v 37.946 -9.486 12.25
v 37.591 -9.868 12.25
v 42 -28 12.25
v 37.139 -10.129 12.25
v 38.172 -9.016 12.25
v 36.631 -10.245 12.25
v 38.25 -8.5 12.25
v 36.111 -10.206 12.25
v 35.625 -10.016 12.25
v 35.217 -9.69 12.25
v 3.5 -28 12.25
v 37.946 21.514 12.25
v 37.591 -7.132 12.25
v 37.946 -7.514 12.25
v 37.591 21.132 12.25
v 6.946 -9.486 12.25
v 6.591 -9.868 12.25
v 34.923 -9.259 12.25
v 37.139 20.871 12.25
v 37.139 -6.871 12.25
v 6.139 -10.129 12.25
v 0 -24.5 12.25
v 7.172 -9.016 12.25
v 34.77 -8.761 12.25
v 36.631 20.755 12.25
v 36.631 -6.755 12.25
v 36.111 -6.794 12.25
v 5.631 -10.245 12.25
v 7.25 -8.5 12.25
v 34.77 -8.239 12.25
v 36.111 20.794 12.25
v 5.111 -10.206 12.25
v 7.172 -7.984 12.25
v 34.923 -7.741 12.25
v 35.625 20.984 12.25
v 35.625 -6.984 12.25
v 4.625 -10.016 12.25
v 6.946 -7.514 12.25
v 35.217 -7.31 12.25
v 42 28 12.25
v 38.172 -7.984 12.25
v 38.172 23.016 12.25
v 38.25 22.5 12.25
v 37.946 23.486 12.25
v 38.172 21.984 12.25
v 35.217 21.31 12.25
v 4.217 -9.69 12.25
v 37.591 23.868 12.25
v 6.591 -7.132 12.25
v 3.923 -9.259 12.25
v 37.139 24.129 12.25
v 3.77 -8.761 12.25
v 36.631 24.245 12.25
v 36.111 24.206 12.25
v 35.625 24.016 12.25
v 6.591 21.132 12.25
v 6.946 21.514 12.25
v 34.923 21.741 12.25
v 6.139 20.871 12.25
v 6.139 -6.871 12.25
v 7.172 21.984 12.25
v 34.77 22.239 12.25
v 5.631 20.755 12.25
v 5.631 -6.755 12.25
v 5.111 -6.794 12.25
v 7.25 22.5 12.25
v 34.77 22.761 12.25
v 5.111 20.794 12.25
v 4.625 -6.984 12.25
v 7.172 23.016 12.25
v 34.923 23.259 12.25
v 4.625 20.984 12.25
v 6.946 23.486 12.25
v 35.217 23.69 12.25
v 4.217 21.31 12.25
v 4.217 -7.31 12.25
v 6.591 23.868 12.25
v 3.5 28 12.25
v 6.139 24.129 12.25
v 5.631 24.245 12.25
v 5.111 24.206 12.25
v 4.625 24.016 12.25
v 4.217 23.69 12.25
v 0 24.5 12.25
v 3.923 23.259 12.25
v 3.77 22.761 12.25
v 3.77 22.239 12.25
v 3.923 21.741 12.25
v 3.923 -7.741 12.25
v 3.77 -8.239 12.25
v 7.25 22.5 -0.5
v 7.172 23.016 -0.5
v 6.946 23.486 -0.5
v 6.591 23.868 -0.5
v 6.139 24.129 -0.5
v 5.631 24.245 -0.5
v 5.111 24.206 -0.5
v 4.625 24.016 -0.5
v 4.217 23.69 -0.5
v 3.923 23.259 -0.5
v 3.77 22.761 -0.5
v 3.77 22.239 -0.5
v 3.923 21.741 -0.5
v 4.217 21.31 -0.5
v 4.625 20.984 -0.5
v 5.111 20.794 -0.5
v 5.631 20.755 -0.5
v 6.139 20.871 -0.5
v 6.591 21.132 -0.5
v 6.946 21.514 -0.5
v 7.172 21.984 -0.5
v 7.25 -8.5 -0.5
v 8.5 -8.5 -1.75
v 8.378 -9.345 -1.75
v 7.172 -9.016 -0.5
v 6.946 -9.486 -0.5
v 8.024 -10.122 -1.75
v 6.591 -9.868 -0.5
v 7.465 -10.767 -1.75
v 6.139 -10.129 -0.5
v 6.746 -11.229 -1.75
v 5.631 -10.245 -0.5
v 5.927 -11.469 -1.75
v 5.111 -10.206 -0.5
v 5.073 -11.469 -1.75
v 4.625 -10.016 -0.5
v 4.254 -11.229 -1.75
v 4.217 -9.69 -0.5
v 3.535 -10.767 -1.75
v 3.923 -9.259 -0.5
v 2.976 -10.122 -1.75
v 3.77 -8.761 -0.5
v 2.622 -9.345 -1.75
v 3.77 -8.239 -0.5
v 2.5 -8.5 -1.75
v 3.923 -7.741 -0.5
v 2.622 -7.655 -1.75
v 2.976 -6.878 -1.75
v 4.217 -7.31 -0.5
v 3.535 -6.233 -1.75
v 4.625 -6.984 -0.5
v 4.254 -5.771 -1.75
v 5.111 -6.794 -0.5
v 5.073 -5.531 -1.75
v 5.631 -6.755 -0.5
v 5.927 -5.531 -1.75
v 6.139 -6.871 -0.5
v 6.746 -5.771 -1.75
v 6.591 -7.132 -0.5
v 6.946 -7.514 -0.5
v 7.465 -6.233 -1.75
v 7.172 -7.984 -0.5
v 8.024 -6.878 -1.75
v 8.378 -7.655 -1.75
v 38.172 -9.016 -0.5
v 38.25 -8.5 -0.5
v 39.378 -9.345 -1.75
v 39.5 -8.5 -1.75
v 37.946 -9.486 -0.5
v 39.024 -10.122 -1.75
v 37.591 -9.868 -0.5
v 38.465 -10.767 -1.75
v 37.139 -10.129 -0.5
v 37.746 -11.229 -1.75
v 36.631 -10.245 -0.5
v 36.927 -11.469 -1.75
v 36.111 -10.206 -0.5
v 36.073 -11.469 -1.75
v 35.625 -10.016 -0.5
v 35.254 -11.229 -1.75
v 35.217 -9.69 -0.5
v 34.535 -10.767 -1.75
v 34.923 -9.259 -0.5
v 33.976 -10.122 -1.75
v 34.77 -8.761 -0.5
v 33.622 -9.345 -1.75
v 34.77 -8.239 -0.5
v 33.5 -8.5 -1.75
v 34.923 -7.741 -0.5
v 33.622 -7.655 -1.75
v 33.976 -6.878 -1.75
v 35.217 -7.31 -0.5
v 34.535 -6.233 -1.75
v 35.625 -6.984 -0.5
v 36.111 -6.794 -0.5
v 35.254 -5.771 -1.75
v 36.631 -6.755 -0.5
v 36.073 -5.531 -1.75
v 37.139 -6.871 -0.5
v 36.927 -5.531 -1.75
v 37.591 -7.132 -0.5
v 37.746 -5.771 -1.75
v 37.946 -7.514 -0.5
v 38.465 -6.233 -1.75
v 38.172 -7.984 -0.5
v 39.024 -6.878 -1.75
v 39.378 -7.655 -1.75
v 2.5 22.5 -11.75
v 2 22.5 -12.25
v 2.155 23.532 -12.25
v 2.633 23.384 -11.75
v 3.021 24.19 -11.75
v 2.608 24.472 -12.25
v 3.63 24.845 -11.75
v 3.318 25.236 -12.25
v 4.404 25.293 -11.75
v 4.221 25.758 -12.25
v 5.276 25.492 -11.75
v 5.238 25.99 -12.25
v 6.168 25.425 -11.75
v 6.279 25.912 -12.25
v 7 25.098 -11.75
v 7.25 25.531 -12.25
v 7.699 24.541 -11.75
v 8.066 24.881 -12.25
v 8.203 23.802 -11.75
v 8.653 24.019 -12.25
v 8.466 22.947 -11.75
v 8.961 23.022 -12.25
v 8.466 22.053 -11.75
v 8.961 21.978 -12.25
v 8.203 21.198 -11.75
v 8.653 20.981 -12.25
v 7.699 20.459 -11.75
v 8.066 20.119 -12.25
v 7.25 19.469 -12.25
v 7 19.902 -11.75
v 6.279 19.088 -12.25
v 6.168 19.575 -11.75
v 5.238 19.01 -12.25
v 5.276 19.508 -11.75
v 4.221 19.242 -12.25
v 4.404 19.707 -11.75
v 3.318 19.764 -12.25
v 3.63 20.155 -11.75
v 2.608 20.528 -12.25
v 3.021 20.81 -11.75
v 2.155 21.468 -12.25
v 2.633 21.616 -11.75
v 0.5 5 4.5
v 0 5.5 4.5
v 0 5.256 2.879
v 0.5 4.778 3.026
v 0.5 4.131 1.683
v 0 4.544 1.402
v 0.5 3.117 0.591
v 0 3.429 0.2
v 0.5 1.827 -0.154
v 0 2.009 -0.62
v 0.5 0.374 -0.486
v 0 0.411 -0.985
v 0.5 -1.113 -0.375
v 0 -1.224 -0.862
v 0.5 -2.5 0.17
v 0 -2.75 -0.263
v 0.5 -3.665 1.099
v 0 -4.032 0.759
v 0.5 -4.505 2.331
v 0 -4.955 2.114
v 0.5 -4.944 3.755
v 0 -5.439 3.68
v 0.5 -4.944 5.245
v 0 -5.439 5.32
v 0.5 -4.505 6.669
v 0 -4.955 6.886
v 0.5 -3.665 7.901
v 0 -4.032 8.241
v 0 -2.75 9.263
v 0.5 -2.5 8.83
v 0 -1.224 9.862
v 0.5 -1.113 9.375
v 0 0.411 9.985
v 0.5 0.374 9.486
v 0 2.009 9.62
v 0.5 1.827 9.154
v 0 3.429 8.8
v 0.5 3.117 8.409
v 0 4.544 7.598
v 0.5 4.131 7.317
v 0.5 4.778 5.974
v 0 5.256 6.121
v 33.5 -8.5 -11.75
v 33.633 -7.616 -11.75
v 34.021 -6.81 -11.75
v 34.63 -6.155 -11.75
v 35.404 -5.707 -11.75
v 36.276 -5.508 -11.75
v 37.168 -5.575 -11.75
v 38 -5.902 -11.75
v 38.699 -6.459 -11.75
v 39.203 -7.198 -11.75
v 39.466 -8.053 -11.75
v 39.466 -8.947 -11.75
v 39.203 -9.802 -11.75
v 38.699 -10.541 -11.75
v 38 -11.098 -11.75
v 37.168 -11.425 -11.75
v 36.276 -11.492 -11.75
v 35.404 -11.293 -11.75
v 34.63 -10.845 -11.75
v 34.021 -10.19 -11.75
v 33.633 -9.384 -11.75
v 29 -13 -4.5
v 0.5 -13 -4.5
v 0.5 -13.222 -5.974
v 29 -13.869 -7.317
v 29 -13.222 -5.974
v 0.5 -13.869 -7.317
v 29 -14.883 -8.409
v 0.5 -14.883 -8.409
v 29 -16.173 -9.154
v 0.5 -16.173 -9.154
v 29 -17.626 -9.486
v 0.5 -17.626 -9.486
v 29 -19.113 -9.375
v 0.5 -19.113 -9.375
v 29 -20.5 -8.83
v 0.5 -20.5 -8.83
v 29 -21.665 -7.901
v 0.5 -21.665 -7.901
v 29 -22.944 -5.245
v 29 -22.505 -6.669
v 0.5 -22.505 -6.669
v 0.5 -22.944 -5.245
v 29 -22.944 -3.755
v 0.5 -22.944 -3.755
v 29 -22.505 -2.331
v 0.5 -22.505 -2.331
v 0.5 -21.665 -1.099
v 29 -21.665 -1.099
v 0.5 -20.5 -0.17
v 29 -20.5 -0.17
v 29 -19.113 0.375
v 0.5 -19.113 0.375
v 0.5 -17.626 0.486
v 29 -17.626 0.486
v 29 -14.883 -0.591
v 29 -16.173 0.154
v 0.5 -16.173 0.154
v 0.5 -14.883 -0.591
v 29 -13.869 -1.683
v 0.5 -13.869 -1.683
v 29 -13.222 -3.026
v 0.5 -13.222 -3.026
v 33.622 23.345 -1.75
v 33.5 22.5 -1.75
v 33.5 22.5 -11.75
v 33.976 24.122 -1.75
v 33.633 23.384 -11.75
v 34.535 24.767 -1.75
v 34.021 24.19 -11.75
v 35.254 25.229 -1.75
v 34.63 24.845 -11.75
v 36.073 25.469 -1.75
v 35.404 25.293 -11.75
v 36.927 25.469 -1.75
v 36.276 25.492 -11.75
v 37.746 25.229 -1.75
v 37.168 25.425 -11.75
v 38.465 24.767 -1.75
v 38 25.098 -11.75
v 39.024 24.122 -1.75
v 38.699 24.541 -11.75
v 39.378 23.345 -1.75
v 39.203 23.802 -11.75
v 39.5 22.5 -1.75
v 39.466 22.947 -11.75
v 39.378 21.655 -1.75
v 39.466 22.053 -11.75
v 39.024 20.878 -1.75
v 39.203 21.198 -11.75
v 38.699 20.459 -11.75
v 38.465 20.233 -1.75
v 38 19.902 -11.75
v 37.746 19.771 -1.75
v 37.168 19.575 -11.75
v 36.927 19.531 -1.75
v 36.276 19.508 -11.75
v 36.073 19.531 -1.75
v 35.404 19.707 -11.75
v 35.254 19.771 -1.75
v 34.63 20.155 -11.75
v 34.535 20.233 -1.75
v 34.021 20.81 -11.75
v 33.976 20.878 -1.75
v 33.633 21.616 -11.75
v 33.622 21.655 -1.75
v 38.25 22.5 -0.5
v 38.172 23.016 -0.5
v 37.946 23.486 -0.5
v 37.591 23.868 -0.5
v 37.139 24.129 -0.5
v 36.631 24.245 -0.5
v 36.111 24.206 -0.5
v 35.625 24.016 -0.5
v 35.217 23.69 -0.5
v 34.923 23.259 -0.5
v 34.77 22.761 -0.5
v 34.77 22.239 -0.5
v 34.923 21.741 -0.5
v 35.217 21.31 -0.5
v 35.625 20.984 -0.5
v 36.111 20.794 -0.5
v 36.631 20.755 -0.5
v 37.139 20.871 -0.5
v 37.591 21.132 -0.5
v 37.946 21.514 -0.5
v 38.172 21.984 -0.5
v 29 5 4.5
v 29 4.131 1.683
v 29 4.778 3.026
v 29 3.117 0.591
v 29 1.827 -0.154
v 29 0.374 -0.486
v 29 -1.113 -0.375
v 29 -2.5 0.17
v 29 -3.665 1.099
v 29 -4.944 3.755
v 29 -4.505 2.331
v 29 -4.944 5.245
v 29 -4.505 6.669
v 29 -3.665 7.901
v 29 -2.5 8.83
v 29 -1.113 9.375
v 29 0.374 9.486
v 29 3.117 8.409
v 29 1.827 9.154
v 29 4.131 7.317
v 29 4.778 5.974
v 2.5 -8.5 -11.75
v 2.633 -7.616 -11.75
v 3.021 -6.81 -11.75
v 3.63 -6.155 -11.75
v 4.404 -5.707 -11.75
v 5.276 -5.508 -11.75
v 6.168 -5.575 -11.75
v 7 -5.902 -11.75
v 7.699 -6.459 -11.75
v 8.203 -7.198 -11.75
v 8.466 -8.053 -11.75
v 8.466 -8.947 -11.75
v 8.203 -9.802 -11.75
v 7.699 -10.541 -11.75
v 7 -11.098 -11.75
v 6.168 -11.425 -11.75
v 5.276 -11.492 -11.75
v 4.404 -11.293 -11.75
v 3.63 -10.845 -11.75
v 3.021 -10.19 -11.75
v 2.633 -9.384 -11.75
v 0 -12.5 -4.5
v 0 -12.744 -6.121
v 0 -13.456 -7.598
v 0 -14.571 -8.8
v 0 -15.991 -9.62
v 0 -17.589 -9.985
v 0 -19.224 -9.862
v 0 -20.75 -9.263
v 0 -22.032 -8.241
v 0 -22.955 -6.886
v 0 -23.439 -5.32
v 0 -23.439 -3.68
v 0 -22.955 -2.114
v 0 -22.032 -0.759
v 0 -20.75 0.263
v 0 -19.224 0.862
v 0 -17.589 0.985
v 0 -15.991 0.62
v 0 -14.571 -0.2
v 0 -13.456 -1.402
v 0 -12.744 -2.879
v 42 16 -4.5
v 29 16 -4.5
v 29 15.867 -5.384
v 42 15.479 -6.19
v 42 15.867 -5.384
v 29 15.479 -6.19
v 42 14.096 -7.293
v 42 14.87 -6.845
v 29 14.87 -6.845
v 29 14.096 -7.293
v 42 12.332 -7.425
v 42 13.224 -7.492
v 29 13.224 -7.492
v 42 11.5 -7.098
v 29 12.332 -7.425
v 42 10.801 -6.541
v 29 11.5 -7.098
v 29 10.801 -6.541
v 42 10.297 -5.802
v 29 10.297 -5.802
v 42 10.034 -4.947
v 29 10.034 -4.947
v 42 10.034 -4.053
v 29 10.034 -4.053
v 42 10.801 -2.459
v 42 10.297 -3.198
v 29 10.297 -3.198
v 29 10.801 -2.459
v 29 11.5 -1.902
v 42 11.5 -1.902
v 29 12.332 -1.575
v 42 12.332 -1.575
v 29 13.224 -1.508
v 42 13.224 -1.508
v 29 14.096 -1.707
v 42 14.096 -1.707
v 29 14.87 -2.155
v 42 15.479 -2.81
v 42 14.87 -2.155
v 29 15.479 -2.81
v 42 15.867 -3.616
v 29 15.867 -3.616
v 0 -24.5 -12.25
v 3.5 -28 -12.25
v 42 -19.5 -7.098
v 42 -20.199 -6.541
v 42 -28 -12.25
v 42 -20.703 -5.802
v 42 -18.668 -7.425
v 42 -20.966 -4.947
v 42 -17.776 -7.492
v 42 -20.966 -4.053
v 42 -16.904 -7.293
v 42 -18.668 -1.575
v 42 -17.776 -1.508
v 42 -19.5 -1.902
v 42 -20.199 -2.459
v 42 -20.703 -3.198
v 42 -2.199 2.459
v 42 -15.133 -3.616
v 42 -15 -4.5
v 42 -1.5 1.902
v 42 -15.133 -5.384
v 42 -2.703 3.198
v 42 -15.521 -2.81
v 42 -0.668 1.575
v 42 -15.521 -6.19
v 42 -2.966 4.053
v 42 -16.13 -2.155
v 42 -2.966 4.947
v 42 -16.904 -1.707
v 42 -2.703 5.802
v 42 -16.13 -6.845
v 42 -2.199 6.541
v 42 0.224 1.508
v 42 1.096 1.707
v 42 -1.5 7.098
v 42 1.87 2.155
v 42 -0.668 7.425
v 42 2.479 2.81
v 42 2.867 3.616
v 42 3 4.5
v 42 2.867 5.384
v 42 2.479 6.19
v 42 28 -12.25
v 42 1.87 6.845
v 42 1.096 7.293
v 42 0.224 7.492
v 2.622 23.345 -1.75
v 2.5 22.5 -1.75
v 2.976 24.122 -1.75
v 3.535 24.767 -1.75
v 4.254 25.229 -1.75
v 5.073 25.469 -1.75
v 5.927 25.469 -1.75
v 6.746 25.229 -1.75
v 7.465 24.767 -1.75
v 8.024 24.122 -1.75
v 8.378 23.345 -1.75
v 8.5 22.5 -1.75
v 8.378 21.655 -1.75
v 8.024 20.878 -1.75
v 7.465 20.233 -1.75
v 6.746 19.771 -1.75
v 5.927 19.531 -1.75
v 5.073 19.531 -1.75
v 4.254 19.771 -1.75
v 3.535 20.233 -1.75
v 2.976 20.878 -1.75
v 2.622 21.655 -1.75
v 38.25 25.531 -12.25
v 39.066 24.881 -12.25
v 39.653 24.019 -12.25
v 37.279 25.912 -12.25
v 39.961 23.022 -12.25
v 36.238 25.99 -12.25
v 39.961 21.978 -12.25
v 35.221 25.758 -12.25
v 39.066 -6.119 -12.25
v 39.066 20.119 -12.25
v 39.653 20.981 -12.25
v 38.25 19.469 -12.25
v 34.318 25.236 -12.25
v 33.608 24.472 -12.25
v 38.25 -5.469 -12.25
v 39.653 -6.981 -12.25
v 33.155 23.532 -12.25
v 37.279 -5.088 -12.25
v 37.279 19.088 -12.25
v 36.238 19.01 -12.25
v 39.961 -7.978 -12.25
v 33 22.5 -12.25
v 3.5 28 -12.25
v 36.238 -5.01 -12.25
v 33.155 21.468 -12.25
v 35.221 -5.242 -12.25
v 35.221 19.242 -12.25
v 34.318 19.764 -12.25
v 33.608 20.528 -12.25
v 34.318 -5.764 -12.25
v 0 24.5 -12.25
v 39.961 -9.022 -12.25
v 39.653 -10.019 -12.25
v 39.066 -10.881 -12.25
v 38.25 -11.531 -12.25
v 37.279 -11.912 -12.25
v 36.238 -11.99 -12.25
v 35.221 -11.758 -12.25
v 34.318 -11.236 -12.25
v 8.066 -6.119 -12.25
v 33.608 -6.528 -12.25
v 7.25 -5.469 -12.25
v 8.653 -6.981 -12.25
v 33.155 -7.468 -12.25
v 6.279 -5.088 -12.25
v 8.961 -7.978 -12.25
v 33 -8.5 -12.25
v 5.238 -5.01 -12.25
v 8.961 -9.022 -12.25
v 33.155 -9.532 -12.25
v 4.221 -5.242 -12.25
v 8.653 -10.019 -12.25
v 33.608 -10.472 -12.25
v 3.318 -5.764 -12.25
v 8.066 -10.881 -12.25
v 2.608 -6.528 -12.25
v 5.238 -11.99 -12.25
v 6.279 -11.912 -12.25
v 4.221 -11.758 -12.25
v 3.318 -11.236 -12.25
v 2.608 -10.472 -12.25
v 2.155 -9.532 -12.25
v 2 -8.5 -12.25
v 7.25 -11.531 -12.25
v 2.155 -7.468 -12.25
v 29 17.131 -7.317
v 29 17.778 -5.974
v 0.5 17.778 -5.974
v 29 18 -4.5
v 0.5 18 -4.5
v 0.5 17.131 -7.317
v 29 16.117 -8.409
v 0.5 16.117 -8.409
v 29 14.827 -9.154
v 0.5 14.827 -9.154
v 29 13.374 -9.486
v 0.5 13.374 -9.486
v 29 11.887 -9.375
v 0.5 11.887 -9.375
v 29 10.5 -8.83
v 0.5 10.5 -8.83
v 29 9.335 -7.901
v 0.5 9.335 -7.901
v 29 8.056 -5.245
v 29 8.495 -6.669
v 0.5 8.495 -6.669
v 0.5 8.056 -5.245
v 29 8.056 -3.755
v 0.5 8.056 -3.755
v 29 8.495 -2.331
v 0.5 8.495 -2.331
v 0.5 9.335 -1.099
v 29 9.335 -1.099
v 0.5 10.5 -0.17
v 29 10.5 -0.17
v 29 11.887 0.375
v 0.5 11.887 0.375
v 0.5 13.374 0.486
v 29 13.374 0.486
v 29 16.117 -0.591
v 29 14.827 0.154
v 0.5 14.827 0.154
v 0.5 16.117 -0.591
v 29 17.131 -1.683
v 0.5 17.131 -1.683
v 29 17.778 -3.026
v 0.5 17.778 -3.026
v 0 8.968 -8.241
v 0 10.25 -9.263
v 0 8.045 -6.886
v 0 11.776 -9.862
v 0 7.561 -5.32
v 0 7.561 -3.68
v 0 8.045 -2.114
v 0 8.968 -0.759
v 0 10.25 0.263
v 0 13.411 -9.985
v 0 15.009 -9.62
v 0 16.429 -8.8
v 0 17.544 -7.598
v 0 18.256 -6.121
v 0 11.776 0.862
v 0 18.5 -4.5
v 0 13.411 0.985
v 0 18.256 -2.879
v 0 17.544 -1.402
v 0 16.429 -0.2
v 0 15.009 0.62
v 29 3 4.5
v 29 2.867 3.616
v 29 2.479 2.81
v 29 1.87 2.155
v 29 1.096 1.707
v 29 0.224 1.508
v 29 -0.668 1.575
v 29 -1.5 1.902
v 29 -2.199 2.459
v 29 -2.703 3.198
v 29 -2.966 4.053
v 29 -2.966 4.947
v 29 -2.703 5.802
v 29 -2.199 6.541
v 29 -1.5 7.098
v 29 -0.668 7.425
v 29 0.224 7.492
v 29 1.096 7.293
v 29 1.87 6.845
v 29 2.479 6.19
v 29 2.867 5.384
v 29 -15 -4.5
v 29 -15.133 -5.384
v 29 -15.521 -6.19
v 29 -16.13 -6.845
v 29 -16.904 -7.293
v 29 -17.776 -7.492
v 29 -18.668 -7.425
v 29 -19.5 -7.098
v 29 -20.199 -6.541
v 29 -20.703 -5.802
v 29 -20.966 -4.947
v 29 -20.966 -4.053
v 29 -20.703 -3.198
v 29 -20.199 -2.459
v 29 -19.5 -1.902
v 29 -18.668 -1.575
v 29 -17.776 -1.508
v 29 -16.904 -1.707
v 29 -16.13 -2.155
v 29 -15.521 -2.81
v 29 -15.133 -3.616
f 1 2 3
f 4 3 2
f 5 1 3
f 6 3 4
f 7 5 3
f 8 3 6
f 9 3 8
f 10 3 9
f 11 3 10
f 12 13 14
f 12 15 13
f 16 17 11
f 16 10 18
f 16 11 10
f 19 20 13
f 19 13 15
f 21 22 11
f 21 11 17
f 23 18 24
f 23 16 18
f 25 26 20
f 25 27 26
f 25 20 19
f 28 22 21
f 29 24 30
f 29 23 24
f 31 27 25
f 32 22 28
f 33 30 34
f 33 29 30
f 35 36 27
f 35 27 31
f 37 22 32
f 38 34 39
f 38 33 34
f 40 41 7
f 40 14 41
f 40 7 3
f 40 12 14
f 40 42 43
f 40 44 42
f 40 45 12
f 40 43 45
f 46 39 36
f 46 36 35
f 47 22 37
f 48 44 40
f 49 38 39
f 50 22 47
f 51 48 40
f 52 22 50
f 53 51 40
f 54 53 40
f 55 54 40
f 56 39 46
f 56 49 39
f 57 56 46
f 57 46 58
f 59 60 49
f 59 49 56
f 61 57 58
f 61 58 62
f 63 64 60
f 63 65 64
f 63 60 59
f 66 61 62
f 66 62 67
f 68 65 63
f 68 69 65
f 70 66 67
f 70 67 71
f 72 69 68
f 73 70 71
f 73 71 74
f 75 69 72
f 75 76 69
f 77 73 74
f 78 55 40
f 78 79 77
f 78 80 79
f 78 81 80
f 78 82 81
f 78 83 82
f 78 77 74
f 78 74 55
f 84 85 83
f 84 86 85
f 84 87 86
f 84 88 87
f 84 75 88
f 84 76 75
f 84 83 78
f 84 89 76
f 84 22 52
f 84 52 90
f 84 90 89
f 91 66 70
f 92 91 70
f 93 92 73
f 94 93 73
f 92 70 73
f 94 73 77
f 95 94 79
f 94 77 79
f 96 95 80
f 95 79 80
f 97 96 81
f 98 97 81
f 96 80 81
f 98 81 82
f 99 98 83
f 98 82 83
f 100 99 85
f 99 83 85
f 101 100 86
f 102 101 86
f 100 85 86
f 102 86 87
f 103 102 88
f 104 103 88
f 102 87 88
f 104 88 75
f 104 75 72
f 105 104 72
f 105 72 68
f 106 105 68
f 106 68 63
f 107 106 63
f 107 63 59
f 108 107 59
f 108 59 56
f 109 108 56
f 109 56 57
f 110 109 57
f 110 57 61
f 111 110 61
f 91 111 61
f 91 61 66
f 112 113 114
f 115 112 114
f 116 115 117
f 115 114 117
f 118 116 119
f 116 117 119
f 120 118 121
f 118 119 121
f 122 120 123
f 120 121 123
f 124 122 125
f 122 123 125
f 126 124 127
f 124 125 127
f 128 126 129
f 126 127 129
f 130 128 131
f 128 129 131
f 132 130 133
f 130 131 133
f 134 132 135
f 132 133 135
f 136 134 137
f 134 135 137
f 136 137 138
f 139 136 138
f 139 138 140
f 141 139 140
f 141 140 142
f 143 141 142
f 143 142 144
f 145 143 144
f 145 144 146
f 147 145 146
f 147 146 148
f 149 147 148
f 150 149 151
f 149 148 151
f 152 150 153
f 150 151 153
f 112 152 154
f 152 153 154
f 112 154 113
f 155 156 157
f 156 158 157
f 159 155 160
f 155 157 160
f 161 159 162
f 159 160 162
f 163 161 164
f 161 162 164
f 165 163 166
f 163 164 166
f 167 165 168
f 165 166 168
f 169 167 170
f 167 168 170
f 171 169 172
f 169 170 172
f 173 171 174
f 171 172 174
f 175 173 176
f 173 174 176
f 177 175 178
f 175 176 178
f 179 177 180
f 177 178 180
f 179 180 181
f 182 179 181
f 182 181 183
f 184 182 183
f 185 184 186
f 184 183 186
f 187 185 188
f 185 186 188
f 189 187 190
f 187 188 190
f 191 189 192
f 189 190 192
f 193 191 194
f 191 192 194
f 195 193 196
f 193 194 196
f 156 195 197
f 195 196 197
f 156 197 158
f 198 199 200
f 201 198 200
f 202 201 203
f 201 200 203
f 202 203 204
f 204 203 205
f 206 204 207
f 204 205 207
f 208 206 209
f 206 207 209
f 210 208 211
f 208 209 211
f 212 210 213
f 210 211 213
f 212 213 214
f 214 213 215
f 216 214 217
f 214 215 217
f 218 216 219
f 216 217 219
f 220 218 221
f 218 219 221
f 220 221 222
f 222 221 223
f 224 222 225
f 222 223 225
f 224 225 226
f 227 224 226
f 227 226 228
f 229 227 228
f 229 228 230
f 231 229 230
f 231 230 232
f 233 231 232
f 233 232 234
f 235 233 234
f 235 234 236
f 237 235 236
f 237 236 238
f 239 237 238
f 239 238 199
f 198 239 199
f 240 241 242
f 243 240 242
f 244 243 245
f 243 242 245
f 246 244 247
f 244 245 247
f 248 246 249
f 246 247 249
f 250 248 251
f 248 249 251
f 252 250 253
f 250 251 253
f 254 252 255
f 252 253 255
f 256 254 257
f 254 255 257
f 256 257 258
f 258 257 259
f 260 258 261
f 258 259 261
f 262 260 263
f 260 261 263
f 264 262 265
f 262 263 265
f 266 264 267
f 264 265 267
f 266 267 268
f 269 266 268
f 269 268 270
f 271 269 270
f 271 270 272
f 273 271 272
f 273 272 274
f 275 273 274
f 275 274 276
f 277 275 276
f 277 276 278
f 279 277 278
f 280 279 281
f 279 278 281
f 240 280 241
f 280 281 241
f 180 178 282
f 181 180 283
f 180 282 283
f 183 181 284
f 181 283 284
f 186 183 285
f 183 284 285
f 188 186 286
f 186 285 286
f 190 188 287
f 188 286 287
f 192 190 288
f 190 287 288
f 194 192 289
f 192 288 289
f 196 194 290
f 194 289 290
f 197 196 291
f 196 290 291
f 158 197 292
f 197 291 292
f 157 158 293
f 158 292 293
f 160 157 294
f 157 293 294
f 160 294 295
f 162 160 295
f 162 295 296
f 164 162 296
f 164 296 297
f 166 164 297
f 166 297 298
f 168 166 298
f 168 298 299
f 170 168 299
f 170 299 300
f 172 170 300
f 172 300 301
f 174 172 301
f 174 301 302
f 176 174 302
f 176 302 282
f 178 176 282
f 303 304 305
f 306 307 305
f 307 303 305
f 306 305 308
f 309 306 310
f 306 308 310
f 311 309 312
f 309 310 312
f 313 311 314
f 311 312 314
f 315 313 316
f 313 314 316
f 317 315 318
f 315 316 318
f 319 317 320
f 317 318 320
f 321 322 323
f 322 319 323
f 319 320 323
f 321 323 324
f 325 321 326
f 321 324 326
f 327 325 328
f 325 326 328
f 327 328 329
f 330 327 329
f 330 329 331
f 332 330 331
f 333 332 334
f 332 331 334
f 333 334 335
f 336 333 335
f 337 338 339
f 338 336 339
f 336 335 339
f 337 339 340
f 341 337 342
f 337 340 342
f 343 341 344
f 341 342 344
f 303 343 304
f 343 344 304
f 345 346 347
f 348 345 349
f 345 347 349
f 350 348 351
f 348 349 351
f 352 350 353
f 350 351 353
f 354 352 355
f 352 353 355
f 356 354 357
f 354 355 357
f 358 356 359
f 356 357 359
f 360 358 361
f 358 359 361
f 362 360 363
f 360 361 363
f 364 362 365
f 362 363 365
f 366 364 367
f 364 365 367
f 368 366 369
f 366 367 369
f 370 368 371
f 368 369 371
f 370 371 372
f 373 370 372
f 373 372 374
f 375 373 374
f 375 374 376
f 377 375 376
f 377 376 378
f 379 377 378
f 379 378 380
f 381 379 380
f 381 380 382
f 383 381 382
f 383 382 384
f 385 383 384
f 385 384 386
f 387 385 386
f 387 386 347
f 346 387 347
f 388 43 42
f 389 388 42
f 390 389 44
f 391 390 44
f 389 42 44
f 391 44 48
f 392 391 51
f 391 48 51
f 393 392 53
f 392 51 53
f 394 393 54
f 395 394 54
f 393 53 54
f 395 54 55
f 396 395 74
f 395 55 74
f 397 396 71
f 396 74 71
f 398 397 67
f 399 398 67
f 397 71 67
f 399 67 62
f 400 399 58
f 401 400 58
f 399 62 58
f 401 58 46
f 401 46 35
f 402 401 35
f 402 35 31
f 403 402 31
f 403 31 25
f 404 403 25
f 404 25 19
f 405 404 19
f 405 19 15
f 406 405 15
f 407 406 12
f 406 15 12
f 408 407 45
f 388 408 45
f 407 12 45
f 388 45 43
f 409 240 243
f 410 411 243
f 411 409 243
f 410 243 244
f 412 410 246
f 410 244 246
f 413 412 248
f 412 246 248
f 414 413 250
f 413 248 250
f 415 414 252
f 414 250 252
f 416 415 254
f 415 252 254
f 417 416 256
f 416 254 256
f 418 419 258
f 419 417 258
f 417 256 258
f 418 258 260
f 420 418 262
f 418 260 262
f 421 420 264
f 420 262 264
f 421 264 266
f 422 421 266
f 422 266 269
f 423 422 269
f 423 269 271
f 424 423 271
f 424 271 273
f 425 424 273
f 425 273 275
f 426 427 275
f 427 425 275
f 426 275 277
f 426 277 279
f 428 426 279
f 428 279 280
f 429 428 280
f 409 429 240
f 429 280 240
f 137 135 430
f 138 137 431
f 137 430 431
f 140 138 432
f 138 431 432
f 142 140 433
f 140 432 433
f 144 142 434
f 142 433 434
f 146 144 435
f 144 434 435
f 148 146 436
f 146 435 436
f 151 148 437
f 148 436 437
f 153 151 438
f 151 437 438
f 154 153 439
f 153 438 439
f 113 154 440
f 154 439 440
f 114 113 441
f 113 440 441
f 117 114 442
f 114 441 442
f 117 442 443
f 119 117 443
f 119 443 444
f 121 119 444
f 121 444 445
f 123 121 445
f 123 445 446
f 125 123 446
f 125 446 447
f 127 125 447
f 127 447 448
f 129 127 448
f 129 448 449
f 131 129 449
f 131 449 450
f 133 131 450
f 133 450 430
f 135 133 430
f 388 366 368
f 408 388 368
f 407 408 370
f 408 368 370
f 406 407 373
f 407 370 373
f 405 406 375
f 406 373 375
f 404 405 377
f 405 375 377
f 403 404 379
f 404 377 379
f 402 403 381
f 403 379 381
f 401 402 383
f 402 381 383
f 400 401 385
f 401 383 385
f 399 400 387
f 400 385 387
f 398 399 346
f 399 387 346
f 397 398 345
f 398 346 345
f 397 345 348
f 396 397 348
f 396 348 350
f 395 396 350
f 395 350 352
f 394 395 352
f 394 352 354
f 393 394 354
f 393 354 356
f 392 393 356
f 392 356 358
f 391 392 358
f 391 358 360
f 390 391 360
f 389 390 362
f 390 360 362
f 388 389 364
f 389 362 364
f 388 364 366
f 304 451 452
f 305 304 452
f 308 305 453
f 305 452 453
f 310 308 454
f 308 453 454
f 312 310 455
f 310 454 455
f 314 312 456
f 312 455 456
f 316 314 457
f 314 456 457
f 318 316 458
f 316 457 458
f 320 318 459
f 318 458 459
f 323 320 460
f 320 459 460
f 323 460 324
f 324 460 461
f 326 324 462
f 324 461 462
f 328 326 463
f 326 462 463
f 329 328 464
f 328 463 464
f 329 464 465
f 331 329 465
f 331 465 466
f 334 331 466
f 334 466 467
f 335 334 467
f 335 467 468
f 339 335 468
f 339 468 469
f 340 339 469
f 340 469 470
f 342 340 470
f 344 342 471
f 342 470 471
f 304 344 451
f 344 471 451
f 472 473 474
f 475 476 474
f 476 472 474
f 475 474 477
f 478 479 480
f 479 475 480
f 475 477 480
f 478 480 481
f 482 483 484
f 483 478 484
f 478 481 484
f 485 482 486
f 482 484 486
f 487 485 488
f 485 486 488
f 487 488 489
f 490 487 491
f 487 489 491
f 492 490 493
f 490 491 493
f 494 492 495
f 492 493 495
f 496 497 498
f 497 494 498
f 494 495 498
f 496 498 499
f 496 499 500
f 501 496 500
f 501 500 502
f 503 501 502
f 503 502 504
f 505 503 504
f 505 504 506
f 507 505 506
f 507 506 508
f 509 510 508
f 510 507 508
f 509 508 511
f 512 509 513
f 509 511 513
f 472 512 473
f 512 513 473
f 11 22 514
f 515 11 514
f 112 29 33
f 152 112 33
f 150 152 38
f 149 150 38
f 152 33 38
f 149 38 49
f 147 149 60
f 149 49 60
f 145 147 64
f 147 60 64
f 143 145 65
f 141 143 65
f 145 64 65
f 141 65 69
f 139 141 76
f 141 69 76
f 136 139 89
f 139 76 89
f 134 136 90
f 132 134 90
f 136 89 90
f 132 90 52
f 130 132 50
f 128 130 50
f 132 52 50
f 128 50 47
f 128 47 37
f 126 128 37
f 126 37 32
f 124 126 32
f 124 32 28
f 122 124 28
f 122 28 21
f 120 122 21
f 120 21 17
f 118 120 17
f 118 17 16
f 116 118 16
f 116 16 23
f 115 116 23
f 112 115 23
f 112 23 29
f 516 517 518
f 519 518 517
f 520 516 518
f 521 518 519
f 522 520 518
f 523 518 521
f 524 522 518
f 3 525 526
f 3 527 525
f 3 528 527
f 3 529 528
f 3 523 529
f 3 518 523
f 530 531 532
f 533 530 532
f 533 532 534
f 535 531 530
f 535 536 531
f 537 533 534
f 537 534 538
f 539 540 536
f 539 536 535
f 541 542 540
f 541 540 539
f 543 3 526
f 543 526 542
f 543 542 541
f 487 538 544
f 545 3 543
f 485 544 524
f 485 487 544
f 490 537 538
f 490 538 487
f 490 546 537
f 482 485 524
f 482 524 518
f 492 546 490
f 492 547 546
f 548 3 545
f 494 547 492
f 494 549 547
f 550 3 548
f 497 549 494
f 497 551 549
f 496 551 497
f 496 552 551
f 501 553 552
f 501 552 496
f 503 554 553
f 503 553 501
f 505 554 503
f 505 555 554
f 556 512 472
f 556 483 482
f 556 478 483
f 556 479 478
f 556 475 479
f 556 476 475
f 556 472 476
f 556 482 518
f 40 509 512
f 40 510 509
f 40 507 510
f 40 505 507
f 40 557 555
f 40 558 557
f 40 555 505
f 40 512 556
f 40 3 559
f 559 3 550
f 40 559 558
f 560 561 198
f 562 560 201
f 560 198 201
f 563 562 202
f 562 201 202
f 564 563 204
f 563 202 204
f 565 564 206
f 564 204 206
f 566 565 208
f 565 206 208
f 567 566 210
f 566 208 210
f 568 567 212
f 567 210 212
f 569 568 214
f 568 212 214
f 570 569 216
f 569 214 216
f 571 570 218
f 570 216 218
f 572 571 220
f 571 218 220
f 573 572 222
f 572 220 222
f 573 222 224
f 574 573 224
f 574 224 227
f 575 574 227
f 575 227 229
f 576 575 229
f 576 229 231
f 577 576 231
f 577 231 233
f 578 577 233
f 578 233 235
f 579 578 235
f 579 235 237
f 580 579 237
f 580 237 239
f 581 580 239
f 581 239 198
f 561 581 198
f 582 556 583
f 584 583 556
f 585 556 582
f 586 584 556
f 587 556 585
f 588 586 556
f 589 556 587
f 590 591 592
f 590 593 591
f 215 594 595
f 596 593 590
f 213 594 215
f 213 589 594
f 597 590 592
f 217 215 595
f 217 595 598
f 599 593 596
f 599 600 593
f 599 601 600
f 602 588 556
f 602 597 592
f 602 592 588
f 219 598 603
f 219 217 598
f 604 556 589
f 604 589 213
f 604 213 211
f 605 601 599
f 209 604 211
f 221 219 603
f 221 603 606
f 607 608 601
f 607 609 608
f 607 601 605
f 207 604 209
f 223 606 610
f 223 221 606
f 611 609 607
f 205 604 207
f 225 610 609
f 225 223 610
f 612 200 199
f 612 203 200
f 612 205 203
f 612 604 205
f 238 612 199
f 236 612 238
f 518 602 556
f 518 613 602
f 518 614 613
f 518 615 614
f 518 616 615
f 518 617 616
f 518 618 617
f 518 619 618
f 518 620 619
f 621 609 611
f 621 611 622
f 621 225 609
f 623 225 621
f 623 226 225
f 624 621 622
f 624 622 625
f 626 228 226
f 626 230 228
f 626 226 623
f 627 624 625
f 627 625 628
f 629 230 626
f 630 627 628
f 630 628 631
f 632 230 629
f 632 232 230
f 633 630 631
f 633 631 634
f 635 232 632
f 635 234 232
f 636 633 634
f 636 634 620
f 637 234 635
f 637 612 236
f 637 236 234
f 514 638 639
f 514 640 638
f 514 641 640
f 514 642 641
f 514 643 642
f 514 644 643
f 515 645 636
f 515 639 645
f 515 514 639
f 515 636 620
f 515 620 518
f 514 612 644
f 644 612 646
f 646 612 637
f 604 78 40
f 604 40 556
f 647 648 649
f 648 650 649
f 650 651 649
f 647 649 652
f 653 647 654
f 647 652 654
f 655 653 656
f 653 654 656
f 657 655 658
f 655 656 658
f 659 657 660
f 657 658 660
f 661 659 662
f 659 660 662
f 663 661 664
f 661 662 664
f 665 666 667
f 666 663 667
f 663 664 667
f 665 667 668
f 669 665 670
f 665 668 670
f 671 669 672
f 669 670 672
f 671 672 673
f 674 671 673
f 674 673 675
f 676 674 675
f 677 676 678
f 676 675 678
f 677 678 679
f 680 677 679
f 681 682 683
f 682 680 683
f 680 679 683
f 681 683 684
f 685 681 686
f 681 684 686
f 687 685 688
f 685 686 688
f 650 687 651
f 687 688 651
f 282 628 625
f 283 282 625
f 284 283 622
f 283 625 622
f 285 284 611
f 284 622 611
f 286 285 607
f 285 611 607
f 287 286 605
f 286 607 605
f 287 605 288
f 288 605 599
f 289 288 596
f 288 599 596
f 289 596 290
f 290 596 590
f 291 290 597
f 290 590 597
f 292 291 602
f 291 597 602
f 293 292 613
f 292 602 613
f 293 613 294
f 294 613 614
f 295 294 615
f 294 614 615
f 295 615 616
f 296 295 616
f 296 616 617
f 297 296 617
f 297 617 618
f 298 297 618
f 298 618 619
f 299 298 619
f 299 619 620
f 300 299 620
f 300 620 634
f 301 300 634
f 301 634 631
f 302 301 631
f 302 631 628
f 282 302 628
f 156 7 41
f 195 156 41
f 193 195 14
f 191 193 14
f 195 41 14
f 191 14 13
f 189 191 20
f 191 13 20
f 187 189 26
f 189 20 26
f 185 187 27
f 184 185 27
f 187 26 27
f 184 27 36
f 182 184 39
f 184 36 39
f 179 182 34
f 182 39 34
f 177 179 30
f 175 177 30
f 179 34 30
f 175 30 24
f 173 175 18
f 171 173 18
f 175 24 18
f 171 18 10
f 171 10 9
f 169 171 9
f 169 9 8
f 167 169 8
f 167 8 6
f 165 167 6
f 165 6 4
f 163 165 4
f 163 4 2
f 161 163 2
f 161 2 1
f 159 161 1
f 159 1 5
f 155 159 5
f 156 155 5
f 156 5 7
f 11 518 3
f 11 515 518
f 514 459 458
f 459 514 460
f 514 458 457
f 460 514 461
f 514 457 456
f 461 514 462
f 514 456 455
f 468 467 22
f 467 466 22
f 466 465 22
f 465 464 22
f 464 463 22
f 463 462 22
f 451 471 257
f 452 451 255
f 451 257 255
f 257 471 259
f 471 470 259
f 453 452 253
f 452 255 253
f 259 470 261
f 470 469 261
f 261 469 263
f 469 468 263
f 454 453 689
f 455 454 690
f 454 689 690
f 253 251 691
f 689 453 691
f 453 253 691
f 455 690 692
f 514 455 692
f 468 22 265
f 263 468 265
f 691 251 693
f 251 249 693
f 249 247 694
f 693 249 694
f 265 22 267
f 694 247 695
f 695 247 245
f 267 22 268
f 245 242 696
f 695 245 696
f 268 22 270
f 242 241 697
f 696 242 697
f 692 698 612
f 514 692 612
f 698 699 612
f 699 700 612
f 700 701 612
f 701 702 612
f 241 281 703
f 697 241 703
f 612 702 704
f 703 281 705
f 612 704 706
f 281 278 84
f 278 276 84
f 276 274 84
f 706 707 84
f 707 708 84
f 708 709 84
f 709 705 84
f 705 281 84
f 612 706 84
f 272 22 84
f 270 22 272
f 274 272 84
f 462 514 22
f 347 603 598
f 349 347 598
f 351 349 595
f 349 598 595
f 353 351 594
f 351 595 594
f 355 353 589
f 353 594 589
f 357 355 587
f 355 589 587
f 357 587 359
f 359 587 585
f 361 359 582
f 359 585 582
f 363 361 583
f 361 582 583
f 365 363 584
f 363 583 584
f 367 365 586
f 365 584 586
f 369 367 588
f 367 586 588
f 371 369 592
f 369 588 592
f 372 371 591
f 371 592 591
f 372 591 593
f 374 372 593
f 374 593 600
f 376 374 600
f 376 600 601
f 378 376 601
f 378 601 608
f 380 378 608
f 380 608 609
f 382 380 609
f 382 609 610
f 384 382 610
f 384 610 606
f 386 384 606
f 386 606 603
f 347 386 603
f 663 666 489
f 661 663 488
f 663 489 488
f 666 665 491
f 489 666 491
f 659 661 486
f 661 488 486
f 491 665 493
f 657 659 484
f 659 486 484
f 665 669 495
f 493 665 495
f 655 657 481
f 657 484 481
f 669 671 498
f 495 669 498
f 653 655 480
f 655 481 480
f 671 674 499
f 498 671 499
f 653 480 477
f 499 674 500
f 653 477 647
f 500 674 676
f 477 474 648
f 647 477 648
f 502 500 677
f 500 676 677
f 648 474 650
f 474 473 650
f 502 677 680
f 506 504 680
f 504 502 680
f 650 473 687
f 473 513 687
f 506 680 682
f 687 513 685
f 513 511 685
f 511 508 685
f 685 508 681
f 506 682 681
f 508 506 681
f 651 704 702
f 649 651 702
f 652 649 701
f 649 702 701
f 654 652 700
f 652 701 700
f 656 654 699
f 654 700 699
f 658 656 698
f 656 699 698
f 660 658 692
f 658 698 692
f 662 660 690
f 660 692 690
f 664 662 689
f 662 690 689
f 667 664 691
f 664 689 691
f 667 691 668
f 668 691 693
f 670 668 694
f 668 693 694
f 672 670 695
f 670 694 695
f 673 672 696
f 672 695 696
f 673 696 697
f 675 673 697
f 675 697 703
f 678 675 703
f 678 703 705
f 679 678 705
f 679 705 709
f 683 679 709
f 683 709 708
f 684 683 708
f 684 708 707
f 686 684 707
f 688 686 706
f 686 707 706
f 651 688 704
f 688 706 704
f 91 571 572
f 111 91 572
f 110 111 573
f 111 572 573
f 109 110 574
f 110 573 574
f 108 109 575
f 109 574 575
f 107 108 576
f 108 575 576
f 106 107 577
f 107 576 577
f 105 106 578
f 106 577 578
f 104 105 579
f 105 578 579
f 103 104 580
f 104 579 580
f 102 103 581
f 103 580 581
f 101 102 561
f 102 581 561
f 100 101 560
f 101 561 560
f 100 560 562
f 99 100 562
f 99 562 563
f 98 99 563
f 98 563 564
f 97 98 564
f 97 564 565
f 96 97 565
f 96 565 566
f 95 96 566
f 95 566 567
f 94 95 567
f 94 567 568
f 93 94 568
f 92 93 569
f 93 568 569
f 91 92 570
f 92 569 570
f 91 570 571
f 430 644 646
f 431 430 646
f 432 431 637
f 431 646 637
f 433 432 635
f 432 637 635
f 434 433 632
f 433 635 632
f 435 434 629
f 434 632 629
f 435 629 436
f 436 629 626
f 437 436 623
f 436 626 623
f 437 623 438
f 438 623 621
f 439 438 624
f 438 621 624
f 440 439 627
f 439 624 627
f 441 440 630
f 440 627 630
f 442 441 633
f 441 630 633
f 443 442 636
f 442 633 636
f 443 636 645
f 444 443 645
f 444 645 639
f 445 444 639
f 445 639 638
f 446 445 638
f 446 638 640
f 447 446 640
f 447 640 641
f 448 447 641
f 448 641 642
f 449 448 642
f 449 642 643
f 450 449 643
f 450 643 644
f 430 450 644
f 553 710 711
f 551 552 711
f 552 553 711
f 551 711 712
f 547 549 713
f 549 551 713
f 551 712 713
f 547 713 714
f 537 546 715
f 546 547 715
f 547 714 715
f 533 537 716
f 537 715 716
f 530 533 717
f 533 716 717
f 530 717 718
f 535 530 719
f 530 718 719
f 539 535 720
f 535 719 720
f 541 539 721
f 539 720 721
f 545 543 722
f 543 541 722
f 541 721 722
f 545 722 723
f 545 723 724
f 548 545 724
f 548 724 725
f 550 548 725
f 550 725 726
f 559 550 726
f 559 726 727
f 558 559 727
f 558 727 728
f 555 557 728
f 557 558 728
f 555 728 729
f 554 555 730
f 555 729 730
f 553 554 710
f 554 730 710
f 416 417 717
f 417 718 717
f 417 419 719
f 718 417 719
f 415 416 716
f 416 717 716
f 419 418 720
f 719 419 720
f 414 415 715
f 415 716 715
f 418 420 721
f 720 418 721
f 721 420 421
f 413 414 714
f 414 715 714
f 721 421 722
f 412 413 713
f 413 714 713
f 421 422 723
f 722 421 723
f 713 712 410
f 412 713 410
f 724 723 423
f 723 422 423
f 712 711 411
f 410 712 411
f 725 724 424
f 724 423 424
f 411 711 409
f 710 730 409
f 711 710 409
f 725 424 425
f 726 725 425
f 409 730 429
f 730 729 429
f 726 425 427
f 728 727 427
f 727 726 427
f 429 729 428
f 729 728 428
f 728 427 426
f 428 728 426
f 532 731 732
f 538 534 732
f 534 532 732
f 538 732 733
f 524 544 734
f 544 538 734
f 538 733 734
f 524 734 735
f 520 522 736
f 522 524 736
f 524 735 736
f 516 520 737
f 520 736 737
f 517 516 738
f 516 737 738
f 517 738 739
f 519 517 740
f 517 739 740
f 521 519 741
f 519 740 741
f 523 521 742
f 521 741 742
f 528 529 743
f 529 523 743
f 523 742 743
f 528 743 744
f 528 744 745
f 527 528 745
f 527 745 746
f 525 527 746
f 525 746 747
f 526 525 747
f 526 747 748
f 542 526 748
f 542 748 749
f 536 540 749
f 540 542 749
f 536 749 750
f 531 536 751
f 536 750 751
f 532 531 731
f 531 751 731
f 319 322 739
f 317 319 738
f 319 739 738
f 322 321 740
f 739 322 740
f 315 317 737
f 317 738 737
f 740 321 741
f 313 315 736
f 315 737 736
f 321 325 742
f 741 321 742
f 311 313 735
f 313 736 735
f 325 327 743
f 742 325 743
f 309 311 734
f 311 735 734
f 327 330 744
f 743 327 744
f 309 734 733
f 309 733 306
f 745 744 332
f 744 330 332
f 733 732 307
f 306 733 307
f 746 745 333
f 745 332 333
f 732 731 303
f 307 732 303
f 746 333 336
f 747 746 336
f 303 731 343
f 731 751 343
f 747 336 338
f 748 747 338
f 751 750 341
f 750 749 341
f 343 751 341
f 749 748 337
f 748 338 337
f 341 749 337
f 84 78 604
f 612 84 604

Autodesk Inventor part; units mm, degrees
ref_plane "YZ Plane" through (0, 0, 0) normal (1, 0, 0) x (0, 1, 0)
ref_plane "XZ Plane" through (0, 0, 0) normal (0, 1, 0) x (-1, 0, 0)
ref_plane "XY Plane" through (0, 0, 0) normal (0, 0, 1) x (1, 0, 0)
sketch "Sketch1" plane through (0, 0, 0) normal (1, 0, 0) x (0, 1, 0)
  line L0 (-28, 12.25) -> (28, 12.25)
  line L1 (28, 12.25) -> (28, -12.25)
  line L2 (28, -12.25) -> (-28, -12.25)
  line L3 (-28, -12.25) -> (-28, 12.25)
  line L4 (-28, 12.25) -> (28, -12.25) construction
  line L5 (28, 12.25) -> (-28, -12.25) construction
  circle A0 centre (13, -4.5) radius 5
  circle A1 centre (0, 4.5) radius 5
  circle A2 centre (-18, -4.5) radius 5
  circle A3 centre (13, -4.5) radius 3
  circle A4 centre (0, 4.5) radius 3
  circle A5 centre (-18, -4.5) radius 3
  point P0 (0, 0)
  dimension "d2" = 56
  dimension "d3" = 24.5
  dimension "d4" = 10
  dimension "d5" = 4.5
  dimension "d6" = 4.5
  dimension "d7" = 15
  dimension "d8" = 6
  dimension "d27" = 10
extrude "Extrusion1" add sketch "Sketch1" along normal blind 42 contours L0 L1 L2 L3 | A0 | A1 | A2
extrude "Extrusion2" cut sketch "Sketch1" along normal blind 29 contours A0 | A1 | A2
sketch "Sketch2" plane through (0, -28, 12.25) normal (0, 0, 1) x (1, 0, 0)
  circle A0 centre (5.5, 50.5) radius 1.75
  circle A1 centre (36.5, 50.5) radius 1.75
  circle A2 centre (36.5, 19.5) radius 1.75
  circle A3 centre (5.5, 19.5) radius 1.75
  line L0 (0, 56) -> (42, 56) projected
  line L1 (0, 56) -> (0, 0) projected
  circle A4 centre (36.5, 50.5) radius 3
  circle A5 centre (5.5, 50.5) radius 3
  circle A6 centre (5.5, 19.5) radius 3
  circle A7 centre (36.5, 19.5) radius 3
  point P0 (0, 28)
  dimension "d11" = 5.5
  dimension "d12" = 5.5
  dimension "d13" = 31
  dimension "d14" = 31
  dimension "d15" = 3.5
  dimension "d21" = 6
extrude "Extrusion3" cut sketch "Sketch2" against normal blind 28.75 contours A0 | A1 | A2 | A3
chamfer "Chamfer1" distance 3.5 angle 45 2 edges at (0, 28, 0) (0, -28, 0)
sketch "Sketch3" plane through (42, -28, -12.25) normal (0, 0, -1) x (-1, 0, 0)
  circle A0 centre (5.5, 50.5) radius 3 projected
  circle A1 centre (36.5, 50.5) radius 3 projected
  circle A2 centre (36.5, 19.5) radius 3 projected
  circle A3 centre (5.5, 19.5) radius 3 projected
  point P0 (42, 28)
extrude "Extrusion4" cut sketch "Sketch3" against normal blind 10.5
chamfer "Chamfer2" distance 1.25 angle 45 4 edges at (34.75, 22.5, -1.75) (3.75, 22.5, -1.75) (3.75, -8.5, -1.75) (34.75, -8.5, -1.75)
chamfer "Chamfer3" distance 0.5 angle 45 7 edges at (39.5, 22.5, -12.25) (8.5, 22.5, -12.25) (0, 8, -4.5) (0, -5, 4.5) (0, -23, -4.5) (8.5, -8.5, -12.25) (39.5, -8.5, -12.25)
properties part number "ZaxisMotorMount_3DPrint"
